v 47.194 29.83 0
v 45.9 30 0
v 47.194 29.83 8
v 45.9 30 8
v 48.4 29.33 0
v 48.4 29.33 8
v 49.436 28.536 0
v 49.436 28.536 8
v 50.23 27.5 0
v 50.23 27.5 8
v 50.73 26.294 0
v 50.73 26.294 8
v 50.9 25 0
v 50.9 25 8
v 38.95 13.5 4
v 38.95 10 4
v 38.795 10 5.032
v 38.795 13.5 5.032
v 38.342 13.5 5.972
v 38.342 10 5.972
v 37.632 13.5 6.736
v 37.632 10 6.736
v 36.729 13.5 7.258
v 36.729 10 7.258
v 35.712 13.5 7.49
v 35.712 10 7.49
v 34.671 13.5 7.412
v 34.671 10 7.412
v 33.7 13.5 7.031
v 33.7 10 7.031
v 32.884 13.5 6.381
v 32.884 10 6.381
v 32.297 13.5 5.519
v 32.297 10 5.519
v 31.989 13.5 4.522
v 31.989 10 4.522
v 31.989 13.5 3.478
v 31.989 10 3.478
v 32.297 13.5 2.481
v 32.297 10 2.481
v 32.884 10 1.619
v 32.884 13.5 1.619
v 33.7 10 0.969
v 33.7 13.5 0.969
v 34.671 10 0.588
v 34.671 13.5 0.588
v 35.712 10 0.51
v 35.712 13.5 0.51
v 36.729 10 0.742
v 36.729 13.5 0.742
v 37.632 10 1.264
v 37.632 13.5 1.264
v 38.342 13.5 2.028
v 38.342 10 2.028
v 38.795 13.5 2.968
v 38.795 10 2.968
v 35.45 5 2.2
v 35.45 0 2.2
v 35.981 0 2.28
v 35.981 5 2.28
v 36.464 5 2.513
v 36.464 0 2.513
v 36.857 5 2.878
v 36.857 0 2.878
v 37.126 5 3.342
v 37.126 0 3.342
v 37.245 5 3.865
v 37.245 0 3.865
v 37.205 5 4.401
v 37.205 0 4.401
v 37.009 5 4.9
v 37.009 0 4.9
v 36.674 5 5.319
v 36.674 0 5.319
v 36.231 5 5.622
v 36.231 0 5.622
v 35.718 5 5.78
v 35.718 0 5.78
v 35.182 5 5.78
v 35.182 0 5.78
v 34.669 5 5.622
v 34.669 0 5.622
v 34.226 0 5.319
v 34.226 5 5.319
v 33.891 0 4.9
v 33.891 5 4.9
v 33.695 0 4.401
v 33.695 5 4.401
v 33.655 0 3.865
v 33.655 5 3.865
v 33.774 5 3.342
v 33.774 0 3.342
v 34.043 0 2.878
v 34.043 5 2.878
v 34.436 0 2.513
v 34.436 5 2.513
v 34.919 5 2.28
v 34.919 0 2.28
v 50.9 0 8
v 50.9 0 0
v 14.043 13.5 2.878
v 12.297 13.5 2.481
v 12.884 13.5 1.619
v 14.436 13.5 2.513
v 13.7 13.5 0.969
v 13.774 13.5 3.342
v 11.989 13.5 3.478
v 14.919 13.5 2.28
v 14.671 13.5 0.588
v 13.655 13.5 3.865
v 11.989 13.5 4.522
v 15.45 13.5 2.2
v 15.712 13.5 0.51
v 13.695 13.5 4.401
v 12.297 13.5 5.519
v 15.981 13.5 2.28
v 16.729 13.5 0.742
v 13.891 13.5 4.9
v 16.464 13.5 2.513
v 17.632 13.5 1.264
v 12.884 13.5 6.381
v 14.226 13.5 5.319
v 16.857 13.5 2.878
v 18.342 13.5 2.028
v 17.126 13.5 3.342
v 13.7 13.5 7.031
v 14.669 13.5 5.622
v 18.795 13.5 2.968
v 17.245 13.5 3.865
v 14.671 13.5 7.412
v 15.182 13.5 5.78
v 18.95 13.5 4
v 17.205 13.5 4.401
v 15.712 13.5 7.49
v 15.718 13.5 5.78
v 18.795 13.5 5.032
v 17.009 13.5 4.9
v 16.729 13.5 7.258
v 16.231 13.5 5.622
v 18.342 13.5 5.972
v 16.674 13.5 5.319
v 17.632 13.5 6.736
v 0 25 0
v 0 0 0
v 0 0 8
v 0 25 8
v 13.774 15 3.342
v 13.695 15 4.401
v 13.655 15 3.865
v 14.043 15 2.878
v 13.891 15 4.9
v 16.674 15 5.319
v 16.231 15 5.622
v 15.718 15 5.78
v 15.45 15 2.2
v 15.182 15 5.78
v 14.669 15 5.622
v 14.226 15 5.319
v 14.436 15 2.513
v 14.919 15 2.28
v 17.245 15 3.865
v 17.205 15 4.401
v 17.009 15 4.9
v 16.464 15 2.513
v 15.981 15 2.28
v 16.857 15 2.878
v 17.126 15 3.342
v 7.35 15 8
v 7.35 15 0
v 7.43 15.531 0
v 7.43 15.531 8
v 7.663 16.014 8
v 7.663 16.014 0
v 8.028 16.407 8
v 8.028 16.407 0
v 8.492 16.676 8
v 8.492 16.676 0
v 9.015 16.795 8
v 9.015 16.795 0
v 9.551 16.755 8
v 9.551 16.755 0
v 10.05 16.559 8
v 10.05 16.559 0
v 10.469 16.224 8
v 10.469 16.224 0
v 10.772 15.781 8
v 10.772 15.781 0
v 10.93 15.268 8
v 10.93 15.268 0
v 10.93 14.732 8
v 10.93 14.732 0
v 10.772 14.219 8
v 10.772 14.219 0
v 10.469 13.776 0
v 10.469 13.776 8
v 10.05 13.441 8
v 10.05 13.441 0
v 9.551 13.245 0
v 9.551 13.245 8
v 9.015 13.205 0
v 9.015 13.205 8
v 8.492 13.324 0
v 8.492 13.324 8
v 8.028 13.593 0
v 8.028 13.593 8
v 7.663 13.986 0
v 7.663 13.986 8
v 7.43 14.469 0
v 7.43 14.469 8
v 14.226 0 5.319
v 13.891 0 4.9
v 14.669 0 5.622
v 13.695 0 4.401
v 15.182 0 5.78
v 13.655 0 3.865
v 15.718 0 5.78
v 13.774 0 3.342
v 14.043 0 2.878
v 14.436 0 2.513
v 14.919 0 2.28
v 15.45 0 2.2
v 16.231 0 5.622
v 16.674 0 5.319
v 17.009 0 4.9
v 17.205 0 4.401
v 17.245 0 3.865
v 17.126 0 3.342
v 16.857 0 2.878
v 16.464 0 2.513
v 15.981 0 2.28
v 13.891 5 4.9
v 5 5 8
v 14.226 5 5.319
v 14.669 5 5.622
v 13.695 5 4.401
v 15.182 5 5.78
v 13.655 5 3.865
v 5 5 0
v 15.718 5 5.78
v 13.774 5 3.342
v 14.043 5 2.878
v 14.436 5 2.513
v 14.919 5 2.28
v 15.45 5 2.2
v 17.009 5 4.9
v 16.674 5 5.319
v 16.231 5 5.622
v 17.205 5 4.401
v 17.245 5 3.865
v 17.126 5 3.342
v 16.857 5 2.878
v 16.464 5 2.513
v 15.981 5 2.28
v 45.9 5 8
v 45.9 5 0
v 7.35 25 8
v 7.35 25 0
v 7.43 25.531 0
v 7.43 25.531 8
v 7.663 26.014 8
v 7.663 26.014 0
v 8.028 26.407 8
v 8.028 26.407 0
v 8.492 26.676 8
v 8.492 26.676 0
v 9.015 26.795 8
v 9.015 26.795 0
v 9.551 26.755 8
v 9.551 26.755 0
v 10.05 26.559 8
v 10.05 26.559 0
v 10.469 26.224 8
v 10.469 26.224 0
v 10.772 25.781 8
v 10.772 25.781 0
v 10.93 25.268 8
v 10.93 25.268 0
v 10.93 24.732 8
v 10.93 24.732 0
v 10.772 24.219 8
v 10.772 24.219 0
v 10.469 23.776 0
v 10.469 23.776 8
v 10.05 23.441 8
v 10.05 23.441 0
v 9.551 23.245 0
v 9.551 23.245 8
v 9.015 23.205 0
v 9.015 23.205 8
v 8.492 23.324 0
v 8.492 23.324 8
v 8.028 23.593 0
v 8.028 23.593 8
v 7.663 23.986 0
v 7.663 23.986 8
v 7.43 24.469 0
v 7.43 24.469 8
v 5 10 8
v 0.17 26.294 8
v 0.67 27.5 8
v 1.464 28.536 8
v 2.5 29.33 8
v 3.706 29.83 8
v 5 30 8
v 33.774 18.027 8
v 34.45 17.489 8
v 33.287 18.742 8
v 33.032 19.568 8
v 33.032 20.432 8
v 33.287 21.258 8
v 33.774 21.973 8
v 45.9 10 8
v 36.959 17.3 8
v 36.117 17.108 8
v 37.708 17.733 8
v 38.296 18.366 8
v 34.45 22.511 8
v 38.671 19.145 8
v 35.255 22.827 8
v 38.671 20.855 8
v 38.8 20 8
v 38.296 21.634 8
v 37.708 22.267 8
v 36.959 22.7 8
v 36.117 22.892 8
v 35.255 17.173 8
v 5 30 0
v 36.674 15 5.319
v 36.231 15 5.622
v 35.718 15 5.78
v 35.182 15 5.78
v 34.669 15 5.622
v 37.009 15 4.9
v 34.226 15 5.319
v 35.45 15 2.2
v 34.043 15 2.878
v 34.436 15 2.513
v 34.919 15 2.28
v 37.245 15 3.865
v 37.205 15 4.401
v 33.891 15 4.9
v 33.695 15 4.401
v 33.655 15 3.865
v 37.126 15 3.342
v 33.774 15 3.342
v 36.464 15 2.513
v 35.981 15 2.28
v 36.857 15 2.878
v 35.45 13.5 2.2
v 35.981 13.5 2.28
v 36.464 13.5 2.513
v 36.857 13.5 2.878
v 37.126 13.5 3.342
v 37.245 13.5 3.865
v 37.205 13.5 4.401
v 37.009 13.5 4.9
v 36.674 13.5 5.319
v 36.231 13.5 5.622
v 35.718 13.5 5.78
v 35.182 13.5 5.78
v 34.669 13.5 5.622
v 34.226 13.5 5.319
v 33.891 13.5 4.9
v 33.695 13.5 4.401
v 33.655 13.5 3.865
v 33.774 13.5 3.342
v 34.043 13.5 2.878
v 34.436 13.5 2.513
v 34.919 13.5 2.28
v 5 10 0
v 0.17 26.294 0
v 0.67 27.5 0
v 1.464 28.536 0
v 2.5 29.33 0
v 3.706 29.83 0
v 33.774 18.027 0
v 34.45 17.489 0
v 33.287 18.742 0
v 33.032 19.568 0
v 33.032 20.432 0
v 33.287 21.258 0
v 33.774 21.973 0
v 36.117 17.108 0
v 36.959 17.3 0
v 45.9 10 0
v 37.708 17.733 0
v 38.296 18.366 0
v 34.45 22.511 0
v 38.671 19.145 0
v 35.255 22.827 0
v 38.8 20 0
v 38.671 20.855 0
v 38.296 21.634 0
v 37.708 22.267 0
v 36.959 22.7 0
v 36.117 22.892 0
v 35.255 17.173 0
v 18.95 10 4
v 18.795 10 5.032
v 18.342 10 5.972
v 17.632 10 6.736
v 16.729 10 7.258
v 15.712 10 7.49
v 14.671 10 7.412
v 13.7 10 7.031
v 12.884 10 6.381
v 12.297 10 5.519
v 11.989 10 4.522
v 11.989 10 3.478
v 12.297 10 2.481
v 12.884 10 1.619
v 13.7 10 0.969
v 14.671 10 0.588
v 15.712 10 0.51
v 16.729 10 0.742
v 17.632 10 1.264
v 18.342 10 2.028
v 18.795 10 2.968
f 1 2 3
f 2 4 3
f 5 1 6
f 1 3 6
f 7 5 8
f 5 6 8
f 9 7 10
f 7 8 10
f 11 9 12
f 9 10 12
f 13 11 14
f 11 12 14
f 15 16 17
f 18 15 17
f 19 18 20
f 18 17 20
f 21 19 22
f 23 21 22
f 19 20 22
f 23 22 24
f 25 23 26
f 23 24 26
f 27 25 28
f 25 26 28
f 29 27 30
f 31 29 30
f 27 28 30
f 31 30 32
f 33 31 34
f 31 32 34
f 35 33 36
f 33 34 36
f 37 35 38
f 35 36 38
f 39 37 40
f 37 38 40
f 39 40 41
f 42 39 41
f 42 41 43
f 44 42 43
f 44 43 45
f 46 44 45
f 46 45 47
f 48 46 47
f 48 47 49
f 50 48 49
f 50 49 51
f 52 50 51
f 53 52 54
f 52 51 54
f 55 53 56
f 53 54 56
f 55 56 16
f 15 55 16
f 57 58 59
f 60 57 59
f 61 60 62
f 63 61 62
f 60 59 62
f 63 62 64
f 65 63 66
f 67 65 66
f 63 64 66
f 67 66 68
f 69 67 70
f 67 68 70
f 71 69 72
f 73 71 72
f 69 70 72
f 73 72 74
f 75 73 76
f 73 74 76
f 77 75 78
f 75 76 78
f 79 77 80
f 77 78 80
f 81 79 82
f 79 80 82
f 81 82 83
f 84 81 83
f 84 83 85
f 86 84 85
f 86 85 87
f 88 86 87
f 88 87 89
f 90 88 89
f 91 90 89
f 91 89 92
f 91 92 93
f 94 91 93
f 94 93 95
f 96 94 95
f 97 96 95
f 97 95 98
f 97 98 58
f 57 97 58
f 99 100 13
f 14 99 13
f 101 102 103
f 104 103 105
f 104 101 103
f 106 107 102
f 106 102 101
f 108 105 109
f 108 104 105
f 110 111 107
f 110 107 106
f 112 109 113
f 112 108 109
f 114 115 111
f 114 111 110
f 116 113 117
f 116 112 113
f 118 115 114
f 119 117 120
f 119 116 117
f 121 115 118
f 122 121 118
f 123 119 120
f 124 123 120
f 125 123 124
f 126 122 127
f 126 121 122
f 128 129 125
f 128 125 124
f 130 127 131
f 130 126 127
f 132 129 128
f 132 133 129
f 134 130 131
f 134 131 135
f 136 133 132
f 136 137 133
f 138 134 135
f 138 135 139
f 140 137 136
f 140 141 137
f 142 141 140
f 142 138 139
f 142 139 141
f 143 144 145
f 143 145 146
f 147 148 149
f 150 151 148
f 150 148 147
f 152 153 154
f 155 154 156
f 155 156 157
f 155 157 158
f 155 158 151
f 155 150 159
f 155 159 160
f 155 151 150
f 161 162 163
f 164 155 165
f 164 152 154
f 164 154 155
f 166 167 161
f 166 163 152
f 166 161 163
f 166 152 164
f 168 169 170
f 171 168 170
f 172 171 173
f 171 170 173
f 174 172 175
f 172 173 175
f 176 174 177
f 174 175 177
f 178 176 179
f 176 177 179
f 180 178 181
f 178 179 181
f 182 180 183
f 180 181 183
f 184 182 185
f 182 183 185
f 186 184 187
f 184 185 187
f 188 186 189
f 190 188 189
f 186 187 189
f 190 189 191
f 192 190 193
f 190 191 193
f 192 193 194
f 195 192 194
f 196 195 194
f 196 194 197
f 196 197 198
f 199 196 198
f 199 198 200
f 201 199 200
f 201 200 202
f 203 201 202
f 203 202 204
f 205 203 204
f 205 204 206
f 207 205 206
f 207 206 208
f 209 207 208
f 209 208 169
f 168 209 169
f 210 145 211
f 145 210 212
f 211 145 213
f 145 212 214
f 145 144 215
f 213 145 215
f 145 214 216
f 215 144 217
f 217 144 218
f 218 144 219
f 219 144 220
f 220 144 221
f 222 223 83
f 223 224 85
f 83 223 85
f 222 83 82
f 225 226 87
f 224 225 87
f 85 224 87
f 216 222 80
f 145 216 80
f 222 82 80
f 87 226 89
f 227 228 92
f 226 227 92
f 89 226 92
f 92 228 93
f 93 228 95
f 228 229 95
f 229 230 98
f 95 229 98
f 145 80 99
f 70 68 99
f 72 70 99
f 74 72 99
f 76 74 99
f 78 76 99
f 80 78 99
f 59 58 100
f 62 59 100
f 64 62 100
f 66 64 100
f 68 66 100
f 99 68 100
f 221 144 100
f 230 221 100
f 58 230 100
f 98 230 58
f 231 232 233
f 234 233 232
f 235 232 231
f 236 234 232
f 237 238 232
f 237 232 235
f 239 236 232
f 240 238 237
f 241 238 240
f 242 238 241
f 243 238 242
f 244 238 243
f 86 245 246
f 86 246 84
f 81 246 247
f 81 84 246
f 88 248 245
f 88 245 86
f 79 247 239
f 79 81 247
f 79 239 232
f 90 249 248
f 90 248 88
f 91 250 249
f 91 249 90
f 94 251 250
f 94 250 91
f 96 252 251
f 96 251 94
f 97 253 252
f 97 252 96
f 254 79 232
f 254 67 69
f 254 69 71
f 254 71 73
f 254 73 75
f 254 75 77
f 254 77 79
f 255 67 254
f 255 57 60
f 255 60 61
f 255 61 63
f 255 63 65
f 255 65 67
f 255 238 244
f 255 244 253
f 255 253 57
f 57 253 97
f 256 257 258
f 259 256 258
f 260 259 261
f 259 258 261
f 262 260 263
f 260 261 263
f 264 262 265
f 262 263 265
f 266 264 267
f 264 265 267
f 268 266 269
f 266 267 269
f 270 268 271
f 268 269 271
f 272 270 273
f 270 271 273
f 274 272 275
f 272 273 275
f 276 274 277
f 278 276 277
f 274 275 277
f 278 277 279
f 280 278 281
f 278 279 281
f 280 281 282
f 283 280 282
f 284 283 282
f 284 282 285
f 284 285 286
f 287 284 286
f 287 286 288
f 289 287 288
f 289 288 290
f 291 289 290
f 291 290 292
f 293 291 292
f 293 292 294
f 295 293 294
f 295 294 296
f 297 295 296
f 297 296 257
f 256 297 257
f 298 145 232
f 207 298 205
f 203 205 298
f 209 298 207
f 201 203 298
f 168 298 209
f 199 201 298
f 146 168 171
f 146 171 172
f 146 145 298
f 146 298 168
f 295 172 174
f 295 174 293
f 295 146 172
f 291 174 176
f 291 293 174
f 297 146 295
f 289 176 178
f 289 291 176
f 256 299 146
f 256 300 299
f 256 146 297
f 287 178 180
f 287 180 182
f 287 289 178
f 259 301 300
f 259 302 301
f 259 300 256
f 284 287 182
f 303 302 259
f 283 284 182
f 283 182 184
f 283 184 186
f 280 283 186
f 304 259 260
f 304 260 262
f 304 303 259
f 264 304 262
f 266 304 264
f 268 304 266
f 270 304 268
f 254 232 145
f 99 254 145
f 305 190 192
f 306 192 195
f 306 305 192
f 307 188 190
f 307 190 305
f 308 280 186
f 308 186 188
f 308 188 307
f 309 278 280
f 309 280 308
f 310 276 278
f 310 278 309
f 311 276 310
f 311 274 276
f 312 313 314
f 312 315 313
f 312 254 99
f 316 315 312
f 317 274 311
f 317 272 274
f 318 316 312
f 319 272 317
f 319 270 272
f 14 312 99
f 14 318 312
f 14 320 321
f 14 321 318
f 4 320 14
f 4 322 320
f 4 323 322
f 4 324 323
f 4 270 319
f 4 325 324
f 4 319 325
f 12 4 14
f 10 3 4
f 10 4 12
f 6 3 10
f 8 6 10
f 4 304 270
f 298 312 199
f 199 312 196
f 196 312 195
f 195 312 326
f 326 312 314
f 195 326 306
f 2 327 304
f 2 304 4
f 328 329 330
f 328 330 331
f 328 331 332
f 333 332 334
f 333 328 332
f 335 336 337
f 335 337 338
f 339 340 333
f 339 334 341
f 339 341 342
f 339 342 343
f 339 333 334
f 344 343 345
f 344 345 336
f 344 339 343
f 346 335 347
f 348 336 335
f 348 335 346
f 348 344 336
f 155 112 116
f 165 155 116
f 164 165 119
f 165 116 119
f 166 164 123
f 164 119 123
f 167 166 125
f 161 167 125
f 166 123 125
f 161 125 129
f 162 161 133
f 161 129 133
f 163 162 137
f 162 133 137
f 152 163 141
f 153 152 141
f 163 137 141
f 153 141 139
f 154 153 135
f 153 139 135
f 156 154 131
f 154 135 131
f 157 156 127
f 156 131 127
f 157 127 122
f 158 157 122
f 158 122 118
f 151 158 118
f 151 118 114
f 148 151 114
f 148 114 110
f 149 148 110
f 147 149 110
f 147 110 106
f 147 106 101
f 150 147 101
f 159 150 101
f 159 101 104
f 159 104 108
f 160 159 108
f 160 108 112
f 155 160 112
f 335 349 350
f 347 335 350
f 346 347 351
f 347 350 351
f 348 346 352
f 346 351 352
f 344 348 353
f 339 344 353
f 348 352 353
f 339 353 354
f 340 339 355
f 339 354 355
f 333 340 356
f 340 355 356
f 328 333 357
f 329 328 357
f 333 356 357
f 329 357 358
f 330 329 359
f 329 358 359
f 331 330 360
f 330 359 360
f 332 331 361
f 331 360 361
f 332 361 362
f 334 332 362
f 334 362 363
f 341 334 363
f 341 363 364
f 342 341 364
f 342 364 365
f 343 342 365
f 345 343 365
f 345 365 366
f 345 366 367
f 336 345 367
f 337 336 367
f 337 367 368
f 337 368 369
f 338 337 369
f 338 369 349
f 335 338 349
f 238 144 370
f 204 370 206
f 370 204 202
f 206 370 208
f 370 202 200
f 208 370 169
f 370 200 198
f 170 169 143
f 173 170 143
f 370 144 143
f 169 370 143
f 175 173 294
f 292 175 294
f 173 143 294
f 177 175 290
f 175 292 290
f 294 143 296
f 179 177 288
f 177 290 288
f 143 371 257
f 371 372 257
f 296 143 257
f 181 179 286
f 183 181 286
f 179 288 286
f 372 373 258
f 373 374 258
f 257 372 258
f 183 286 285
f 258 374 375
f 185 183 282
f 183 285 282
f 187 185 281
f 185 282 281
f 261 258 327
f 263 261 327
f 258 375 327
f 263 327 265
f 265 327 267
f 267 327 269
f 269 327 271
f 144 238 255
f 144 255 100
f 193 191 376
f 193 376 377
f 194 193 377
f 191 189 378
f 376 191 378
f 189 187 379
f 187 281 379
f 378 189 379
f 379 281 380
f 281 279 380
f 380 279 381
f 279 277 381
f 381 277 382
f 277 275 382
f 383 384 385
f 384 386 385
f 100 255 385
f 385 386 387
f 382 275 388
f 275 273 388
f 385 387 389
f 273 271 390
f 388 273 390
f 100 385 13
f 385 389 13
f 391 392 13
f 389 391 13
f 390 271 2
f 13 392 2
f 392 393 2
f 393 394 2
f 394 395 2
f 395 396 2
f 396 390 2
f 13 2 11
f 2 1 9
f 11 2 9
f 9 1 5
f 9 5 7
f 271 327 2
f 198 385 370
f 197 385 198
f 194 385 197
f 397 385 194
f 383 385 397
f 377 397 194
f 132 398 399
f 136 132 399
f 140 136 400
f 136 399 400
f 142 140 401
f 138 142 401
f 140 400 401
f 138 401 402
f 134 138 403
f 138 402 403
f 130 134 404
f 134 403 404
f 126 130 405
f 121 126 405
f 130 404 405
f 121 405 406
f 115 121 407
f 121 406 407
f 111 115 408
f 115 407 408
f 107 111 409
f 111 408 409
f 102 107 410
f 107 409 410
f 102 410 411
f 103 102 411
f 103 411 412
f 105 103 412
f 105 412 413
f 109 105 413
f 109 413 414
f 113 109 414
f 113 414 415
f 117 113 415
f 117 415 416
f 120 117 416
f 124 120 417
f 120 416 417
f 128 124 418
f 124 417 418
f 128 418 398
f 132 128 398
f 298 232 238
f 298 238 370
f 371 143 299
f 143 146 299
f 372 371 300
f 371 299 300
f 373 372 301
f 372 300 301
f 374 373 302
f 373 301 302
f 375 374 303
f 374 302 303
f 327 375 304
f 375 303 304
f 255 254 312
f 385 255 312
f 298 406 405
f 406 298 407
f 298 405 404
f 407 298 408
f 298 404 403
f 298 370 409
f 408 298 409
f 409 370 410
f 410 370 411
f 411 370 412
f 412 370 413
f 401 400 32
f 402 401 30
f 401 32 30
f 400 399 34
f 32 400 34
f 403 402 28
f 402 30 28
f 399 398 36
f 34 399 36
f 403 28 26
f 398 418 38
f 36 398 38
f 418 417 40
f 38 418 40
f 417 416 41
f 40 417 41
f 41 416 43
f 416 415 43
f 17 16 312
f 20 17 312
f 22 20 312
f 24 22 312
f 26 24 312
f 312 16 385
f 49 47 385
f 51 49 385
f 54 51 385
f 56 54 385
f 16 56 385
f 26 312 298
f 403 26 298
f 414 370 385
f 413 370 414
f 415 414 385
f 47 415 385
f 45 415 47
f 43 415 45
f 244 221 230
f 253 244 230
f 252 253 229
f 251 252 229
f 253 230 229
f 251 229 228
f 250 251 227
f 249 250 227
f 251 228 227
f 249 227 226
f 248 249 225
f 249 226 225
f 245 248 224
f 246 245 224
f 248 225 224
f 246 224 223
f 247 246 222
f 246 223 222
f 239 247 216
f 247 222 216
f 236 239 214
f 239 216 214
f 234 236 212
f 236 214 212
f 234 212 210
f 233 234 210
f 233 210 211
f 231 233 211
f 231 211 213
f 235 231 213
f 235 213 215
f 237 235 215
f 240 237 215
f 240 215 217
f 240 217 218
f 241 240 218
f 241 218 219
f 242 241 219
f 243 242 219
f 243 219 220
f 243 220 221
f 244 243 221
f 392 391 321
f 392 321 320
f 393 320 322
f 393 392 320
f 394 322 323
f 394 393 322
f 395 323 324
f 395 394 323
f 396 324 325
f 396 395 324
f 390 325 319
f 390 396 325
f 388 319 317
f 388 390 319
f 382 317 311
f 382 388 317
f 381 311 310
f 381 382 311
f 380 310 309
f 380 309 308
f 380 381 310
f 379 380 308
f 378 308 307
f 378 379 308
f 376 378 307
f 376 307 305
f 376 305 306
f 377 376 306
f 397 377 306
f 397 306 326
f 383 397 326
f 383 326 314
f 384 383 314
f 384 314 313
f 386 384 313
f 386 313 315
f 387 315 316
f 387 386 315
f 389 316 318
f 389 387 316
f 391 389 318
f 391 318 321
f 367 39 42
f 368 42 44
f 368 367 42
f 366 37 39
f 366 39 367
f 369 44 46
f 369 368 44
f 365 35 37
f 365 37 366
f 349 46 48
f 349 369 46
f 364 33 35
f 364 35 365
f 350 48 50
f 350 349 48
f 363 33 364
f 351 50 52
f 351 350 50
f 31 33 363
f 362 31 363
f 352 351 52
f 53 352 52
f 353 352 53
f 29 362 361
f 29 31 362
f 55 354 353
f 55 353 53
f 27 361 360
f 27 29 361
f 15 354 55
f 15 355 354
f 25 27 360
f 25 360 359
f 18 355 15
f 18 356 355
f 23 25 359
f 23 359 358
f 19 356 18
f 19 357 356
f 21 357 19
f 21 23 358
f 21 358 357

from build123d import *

# Parameters (mm, degrees)
ESQUISSE1_W             = 50.9
ESQUISSE1_H             = 30
ESQUISSE1_R             = 2.9
ESQUISSE1_W_2           = 40.9
ESQUISSE1_H_2           = 5
BOSS_EXTRU_1_DEPTH      = 8
ESQUISSE2_R             = 1.8
ENL_V_MAT_EXTRU_1_DEPTH = 15
CONG_1_R                = 5
ESQUISSE3_R             = 1.8
ENL_V_MAT_EXTRU_2_DEPTH = 10
ESQUISSE4_R             = 3.5
ENL_V_MAT_EXTRU_3_DEPTH = 3.5


with BuildPart() as part:
    # Esquisse1 → Boss.-Extru.1 (new body)
    with BuildSketch(Plane.XY):
        with Locations((25.45, 15)):
            Rectangle(ESQUISSE1_W, ESQUISSE1_H)
        with Locations((35.9, 20)):
            Circle(ESQUISSE1_R, mode=Mode.SUBTRACT)
        with Locations((25.45, 7.5)):
            Rectangle(ESQUISSE1_W_2, ESQUISSE1_H_2, mode=Mode.SUBTRACT)
    extrude(amount=BOSS_EXTRU_1_DEPTH)

    # Esquisse2 → Enlèv. mat.-Extru.1 (cut)
    with BuildSketch(Plane.XZ):
        with Locations(Location((15.45, 4, 0), (0, 0, 270))):
            Circle(ESQUISSE2_R)
        with Locations(Location((35.45, 4, 0), (0, 0, 270))):
            Circle(ESQUISSE2_R)
    extrude(amount=-ENL_V_MAT_EXTRU_1_DEPTH, mode=Mode.SUBTRACT)

    # Congé1
    cong_1_edges = [part.edges().sort_by_distance(p)[0] for p in [
        (0, 30, 4),
        (50.9, 30, 4),
    ]]
    fillet(cong_1_edges, radius=CONG_1_R)

    # Esquisse3 → Enlèv. mat.-Extru.2 (cut)
    with BuildSketch(Plane(origin=(0, 0, 0), x_dir=(-1, 0, 0), z_dir=(0, 0, -1))):
        with Locations((-9.15, 25)):
            Circle(ESQUISSE3_R)
        with Locations((-9.15, 15)):
            Circle(ESQUISSE3_R)
    extrude(amount=-ENL_V_MAT_EXTRU_2_DEPTH, mode=Mode.SUBTRACT)

    # Esquisse4 → Enlèv. mat.-Extru.3 (cut)
    with BuildSketch(Plane.XZ.offset(-10)):
        with Locations((15.45, 4)):
            Circle(ESQUISSE4_R)
        with Locations((35.45, 4)):
            Circle(ESQUISSE4_R)
    extrude(amount=-ENL_V_MAT_EXTRU_3_DEPTH, mode=Mode.SUBTRACT)


solid = part.part
